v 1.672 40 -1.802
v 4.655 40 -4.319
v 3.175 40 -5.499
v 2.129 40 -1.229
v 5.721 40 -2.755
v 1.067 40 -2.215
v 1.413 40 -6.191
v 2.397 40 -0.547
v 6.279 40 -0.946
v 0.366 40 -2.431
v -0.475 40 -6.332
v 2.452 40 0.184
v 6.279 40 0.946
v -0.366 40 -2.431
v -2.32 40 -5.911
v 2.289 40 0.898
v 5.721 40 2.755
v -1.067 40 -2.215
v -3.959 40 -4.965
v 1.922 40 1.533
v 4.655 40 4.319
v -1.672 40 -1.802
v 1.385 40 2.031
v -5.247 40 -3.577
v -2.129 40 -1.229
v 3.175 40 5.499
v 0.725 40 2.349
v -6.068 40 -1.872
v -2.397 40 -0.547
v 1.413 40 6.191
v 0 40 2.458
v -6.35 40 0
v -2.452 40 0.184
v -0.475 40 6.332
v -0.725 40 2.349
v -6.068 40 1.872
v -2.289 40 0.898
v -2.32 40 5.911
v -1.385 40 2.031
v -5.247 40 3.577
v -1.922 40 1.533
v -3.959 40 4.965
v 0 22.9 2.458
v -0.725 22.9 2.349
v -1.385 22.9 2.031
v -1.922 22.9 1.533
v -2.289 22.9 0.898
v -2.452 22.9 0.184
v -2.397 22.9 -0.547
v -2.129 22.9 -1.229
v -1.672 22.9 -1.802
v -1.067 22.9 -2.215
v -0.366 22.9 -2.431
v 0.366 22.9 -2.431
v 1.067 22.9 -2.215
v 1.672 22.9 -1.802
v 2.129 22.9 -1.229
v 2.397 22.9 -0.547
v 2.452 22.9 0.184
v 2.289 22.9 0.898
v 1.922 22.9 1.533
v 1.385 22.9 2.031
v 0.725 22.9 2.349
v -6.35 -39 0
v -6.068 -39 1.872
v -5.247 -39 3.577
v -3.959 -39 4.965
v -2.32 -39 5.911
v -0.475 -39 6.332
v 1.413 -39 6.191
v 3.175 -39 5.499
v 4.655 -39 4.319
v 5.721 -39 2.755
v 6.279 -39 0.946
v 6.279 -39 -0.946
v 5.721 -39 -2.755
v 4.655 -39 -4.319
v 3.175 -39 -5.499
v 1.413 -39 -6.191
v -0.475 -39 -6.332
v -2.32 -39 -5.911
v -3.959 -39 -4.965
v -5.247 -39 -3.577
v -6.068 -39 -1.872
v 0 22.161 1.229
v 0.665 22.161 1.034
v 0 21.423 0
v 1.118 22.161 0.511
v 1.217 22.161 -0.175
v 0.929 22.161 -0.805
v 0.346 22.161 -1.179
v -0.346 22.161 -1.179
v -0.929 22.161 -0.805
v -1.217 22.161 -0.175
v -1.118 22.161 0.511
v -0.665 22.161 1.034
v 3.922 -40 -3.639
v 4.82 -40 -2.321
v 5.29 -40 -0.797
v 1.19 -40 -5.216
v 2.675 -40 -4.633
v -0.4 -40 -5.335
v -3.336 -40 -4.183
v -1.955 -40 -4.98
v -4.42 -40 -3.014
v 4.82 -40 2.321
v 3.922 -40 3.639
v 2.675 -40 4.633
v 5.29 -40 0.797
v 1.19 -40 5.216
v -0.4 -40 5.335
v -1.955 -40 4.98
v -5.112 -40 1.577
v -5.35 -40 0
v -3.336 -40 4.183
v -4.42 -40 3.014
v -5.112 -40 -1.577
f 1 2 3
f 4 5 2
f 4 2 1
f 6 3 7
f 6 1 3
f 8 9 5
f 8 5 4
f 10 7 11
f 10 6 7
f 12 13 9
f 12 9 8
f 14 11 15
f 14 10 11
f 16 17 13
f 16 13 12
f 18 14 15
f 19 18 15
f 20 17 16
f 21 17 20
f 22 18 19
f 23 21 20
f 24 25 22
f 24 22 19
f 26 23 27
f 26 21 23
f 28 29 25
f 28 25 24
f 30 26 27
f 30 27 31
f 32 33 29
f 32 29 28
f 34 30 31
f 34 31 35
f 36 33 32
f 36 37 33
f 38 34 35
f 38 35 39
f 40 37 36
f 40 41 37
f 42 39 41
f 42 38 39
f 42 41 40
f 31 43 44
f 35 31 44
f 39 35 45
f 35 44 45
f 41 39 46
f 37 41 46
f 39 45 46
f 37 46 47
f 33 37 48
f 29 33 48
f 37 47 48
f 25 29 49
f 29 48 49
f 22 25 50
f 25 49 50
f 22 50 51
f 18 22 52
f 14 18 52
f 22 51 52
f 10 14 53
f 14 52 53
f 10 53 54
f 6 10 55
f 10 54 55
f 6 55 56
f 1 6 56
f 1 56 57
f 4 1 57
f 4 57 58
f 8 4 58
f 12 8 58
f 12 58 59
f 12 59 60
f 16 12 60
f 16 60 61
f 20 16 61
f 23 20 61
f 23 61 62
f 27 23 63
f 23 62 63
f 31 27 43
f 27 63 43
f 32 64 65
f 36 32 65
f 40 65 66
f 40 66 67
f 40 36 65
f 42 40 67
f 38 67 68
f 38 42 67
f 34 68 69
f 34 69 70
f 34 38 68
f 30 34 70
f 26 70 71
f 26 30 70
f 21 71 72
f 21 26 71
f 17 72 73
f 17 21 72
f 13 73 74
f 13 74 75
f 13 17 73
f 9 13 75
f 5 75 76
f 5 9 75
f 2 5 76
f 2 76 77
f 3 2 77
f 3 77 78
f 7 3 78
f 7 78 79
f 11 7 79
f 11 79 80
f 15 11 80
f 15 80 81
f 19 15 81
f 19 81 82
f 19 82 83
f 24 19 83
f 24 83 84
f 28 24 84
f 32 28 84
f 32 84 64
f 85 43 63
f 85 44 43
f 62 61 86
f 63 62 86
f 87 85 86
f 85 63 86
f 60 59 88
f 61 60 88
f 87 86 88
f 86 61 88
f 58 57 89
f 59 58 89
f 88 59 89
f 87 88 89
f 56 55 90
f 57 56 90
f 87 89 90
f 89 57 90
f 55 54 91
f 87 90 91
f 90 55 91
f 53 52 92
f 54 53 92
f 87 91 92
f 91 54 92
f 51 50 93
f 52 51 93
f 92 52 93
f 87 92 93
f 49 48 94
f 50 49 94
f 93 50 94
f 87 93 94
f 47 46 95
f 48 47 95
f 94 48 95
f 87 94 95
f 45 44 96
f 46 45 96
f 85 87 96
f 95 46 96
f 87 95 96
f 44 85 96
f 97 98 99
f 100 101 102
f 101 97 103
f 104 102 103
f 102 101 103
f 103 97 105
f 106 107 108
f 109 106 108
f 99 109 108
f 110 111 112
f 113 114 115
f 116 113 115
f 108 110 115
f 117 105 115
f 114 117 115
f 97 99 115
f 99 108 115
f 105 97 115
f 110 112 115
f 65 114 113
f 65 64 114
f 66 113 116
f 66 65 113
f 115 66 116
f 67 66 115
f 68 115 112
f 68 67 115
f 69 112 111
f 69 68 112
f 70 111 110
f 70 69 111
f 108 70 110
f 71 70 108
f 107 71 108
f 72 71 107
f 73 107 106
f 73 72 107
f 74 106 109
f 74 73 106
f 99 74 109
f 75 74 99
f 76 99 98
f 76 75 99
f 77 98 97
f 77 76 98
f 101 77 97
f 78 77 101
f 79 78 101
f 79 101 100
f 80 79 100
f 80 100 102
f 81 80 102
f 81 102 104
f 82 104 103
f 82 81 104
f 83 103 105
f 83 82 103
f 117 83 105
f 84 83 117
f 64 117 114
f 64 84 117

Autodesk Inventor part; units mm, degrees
ref_plane "YZ Plane" through (0, 0, 0) normal (1, 0, 0) x (0, 1, 0)
ref_plane "XZ Plane" through (0, 0, 0) normal (0, 1, 0) x (-1, 0, 0)
ref_plane "XY Plane" through (0, 0, 0) normal (0, 0, 1) x (1, 0, 0)
sketch "Sketch1" plane through (0, 0, 0) normal (0, 1, 0) x (-1, 0, 0)
  circle A0 centre (0, 0) radius 6.35
  dimension "d0" = 12.7
extrude "Extrusion1" add sketch "Sketch1" along normal mid plane 80
chamfer "Chamfer1" distance 1 angle 45 1 edges at (6.35, -40, 0)
hole "Hole3" at (0, 40, 0) direction (0, -1, 0) diameter 4.917 depth 17.1 tip angle 118 thread size "M6x1" class "6H" standard "ANSI Metric M Profile"
properties part number "suporte-barra" material "Aluminium AW-7020"
